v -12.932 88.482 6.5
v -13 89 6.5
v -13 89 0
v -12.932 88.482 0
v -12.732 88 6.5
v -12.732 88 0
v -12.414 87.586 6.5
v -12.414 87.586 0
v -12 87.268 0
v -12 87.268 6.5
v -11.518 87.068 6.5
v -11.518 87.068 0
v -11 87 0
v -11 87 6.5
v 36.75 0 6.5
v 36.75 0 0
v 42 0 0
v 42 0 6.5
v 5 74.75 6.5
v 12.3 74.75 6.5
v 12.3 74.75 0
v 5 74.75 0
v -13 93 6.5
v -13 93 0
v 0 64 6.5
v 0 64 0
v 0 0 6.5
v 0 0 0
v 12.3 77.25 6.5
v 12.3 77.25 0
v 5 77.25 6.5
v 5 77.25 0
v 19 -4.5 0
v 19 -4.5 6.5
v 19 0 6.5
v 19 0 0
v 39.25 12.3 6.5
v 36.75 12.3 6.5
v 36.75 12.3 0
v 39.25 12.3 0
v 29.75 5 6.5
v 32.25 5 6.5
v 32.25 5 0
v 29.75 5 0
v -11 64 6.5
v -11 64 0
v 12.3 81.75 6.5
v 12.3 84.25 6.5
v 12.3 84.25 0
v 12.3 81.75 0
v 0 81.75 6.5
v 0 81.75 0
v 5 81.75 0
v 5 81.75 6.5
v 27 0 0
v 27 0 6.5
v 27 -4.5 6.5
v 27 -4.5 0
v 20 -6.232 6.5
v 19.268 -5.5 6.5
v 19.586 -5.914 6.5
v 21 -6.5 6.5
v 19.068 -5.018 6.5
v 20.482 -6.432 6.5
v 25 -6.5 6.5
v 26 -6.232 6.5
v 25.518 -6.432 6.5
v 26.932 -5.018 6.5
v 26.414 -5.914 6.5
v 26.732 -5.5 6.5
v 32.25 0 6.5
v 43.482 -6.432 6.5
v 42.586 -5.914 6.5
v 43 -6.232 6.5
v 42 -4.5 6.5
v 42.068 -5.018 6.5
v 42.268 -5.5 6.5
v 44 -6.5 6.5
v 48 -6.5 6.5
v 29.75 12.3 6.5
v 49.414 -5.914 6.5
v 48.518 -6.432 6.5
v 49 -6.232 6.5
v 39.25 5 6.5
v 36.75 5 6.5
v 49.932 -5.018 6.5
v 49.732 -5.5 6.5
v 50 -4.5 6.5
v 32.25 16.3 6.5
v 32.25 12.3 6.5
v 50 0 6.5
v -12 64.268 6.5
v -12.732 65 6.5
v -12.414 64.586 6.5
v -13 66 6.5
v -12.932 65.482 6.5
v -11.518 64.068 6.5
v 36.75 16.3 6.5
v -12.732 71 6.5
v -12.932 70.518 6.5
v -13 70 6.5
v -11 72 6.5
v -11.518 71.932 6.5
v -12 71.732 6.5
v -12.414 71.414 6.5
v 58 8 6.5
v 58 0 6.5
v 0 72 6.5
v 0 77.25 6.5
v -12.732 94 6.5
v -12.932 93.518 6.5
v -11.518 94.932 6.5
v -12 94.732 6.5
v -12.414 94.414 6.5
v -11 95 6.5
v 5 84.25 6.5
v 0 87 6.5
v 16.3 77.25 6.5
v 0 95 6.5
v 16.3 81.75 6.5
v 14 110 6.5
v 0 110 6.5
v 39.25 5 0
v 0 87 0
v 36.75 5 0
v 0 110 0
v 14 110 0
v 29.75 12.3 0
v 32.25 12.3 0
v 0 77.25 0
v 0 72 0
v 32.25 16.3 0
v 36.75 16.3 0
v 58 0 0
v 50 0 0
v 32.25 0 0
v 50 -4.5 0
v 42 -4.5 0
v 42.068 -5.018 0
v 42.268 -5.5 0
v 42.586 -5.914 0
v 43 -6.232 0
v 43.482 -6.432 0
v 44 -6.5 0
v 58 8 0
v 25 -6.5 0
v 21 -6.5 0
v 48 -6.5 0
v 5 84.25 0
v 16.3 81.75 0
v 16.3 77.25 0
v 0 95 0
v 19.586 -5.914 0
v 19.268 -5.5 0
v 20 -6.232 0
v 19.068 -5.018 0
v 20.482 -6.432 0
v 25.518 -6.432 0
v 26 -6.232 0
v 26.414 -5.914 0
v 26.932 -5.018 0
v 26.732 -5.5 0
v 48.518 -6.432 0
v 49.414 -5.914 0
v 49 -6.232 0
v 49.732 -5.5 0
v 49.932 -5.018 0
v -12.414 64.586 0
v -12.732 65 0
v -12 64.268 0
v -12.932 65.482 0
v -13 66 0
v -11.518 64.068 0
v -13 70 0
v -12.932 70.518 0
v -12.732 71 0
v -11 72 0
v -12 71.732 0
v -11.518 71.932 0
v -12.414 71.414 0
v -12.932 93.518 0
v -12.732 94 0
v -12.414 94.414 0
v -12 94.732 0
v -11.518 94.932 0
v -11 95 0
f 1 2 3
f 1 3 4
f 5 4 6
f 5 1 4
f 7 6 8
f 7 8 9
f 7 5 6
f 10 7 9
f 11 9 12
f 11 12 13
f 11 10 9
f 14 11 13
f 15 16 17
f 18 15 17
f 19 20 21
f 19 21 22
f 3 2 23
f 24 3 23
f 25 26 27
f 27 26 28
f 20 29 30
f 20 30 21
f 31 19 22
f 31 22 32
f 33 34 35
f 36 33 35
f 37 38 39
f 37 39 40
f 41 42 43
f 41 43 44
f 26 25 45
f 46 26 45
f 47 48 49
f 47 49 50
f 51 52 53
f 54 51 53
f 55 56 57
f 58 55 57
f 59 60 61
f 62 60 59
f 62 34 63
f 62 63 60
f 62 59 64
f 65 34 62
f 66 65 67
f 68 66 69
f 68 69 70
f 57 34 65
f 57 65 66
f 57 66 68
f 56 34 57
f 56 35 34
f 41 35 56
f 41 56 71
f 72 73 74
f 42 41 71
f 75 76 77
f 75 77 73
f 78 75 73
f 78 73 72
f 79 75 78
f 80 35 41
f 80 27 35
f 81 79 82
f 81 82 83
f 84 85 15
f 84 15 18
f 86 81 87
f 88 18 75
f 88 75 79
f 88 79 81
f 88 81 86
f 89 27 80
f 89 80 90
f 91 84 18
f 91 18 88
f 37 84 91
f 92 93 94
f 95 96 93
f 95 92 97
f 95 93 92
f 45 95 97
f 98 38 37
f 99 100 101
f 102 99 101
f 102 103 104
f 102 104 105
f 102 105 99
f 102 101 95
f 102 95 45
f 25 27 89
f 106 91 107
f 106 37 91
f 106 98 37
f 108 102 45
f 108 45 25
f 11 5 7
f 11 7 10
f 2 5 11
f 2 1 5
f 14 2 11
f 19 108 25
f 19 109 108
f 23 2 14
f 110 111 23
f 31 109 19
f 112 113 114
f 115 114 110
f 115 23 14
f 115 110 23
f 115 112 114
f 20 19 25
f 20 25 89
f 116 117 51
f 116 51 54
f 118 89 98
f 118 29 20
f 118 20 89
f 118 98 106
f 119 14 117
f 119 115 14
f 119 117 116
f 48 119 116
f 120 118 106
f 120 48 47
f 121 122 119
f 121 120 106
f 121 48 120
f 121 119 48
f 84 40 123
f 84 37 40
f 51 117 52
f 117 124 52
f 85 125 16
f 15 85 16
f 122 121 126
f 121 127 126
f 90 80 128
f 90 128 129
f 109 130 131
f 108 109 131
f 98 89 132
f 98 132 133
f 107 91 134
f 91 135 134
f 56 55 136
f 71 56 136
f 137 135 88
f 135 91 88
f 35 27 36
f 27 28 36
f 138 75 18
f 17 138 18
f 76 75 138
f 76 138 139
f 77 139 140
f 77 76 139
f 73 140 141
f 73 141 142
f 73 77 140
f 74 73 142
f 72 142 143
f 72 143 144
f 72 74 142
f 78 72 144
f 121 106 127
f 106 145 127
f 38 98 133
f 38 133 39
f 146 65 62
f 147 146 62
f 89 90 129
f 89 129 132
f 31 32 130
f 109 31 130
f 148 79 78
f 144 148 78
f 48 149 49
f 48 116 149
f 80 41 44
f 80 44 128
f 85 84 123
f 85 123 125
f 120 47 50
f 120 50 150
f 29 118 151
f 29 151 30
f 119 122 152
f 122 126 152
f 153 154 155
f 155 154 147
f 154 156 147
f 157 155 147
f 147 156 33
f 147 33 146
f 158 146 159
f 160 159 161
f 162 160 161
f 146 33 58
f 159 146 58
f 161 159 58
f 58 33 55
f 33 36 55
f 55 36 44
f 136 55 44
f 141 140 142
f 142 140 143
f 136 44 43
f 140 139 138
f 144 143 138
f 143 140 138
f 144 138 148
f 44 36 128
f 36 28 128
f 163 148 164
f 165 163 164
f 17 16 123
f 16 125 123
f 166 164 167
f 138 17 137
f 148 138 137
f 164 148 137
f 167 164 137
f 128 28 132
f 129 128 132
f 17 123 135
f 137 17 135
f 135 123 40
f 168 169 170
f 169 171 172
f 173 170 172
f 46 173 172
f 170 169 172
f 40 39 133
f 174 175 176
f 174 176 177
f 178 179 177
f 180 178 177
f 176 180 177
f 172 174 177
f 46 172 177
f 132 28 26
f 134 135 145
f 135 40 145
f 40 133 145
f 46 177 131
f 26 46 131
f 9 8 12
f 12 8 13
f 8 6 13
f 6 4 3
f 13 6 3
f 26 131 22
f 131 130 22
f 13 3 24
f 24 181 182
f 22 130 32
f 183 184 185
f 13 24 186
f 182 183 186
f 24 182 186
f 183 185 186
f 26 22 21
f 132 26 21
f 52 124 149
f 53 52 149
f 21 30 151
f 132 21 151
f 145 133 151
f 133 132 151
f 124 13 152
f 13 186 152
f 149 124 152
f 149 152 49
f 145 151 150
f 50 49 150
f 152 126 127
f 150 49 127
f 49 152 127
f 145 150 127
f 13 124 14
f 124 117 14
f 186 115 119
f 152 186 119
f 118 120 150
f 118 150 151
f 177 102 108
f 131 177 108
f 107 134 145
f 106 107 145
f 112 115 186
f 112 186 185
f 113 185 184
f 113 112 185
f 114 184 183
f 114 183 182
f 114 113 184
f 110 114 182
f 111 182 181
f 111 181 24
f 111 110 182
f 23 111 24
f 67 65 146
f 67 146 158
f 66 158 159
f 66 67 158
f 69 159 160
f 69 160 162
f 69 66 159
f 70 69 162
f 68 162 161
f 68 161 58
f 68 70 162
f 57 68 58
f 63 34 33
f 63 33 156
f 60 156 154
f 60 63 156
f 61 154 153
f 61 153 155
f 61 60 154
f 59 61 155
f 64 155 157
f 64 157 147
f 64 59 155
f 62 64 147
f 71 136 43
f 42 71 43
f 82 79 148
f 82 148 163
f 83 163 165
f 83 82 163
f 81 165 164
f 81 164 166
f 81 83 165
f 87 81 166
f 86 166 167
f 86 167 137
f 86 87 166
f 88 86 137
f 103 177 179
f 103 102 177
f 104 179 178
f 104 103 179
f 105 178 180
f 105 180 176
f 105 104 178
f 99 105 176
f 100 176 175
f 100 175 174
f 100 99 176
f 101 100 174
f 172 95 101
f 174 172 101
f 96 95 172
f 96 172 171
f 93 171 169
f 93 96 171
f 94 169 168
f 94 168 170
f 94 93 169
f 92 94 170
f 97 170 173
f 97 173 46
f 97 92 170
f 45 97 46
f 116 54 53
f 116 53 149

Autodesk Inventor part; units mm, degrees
ref_plane "YZ Plane" through (0, 0, 0) normal (1, 0, 0) x (0, 1, 0)
ref_plane "XZ Plane" through (0, 0, 0) normal (0, 1, 0) x (-1, 0, 0)
ref_plane "XY Plane" through (0, 0, 0) normal (0, 0, 1) x (1, 0, 0)
sketch "Sketch1" plane through (0, 0, 0) normal (0, 0, 1) x (1, 0, 0)
  line L0 (0, 110) -> (0, 0)
  line L1 (0, 0) -> (58, 0)
  line L2 (58, 0) -> (58, 8)
  line L3 (58, 8) -> (14, 110)
  line L4 (14, 110) -> (0, 110)
  dimension "d0" = 58
  dimension "d1" = 8
  dimension "d2" = 14
  dimension "d59" = 110
extrude "Extrusion1" add sketch "Sketch1" along normal blind 6.5
sketch "Sketch4" plane through (0, 0, 6.5) normal (0, 0, 1) x (1, 0, 0)
  line L0 (0, 110) -> (0, 0) projected
  line L1 (0, 0) -> (58, 0) projected
  line L2 (0, 64) -> (-11, 64)
  line L3 (-13, 66) -> (-13, 70)
  line L4 (-11, 72) -> (0, 72)
  line L5 (0, 72) -> (0, 64)
  line L6 (0, 87) -> (-11, 87)
  line L7 (-13, 89) -> (-13, 93)
  line L8 (-11, 95) -> (0, 95)
  line L9 (0, 95) -> (0, 87)
  line L10 (19, 0) -> (27, 0)
  line L11 (27, 0) -> (27, -4.5)
  line L12 (25, -6.5) -> (21, -6.5)
  line L13 (19, -4.5) -> (19, 0)
  line L14 (42, 0) -> (50, 0)
  line L15 (50, 0) -> (50, -4.5)
  line L16 (48, -6.5) -> (44, -6.5)
  line L17 (42, -4.5) -> (42, 0)
  arc A0 (-11, 95) -> (-13, 93) centre (-11, 93) ccw
  arc A1 (-13, 89) -> (-11, 87) centre (-11, 89) ccw
  arc A2 (-11, 72) -> (-13, 70) centre (-11, 70) ccw
  arc A3 (-13, 66) -> (-11, 64) centre (-11, 66) ccw
  arc A4 (19, -4.5) -> (21, -6.5) centre (21, -4.5) ccw
  arc A5 (25, -6.5) -> (27, -4.5) centre (25, -4.5) ccw
  arc A6 (42, -4.5) -> (44, -6.5) centre (44, -4.5) ccw
  arc A7 (48, -6.5) -> (50, -4.5) centre (48, -4.5) ccw
  line L18 (14, 110) -> (0, 110) projected
  dimension "d30" = 2
  dimension "d31" = 8
  dimension "d32" = 8
  dimension "d33" = 8
  dimension "d34" = 8
  dimension "d35" = 13
  dimension "d36" = 6.5
  dimension "d37" = 15
  dimension "d38" = 15
  dimension "d39" = 19
  dimension "d60" = 15
extrude "Extrusion3" add sketch "Sketch4" against normal blind 6.5
sketch "Sketch5" plane through (0, 0, 6.5) normal (0, 0, 1) x (1, 0, 0)
  line L0 (0, 87) -> (0, 72) projected
  line L1 (0, 72) -> (-11, 72) projected
  line L2 (27, 0) -> (42, 0) projected
  line L3 (42, 0) -> (42, -4.5) projected
  line L4 (16.3, 81.75) -> (16.3, 77.25)
  line L5 (0, 77.25) -> (0, 81.75)
  line L6 (5, 84.25) -> (12.3, 84.25)
  line L7 (12.3, 74.75) -> (5, 74.75)
  line L8 (32.25, 16.3) -> (36.75, 16.3)
  line L9 (36.75, 0) -> (32.25, 0)
  line L10 (39.25, 12.3) -> (39.25, 5)
  line L11 (29.75, 5) -> (29.75, 12.3)
  line L12 (0, 81.75) -> (5, 81.75)
  line L13 (12.3, 81.75) -> (16.3, 81.75)
  line L14 (16.3, 77.25) -> (12.3, 77.25)
  line L15 (5, 77.25) -> (0, 77.25)
  line L16 (5, 74.75) -> (5, 77.25)
  line L17 (5, 81.75) -> (5, 84.25)
  line L18 (12.3, 84.25) -> (12.3, 81.75)
  line L19 (12.3, 77.25) -> (12.3, 74.75)
  line L20 (32.25, 0) -> (32.25, 5)
  line L21 (32.25, 12.3) -> (32.25, 16.3)
  line L22 (36.75, 16.3) -> (36.75, 12.3)
  line L23 (36.75, 5) -> (36.75, 0)
  line L24 (29.75, 12.3) -> (32.25, 12.3)
  line L25 (36.75, 12.3) -> (39.25, 12.3)
  line L26 (39.25, 5) -> (36.75, 5)
  line L27 (32.25, 5) -> (29.75, 5)
  point P0 (16.3, 79.5)
  point P1 (34.5, 16.3)
  dimension "d43" = 4.5
  dimension "d44" = 4.5
  dimension "d45" = 5
  dimension "d46" = 4
  dimension "d47" = 7.3
  dimension "d48" = 4
  dimension "d49" = 5
  dimension "d50" = 7.3
  dimension "d51" = 2.5
  dimension "d52" = 2.5
  dimension "d53" = 2.5
  dimension "d54" = 2.5
  dimension "d55" = 7.5
  dimension "d56" = 7.5
extrude "Extrusion4" cut sketch "Sketch5" against normal through all
properties part number "z_motor_brace"
